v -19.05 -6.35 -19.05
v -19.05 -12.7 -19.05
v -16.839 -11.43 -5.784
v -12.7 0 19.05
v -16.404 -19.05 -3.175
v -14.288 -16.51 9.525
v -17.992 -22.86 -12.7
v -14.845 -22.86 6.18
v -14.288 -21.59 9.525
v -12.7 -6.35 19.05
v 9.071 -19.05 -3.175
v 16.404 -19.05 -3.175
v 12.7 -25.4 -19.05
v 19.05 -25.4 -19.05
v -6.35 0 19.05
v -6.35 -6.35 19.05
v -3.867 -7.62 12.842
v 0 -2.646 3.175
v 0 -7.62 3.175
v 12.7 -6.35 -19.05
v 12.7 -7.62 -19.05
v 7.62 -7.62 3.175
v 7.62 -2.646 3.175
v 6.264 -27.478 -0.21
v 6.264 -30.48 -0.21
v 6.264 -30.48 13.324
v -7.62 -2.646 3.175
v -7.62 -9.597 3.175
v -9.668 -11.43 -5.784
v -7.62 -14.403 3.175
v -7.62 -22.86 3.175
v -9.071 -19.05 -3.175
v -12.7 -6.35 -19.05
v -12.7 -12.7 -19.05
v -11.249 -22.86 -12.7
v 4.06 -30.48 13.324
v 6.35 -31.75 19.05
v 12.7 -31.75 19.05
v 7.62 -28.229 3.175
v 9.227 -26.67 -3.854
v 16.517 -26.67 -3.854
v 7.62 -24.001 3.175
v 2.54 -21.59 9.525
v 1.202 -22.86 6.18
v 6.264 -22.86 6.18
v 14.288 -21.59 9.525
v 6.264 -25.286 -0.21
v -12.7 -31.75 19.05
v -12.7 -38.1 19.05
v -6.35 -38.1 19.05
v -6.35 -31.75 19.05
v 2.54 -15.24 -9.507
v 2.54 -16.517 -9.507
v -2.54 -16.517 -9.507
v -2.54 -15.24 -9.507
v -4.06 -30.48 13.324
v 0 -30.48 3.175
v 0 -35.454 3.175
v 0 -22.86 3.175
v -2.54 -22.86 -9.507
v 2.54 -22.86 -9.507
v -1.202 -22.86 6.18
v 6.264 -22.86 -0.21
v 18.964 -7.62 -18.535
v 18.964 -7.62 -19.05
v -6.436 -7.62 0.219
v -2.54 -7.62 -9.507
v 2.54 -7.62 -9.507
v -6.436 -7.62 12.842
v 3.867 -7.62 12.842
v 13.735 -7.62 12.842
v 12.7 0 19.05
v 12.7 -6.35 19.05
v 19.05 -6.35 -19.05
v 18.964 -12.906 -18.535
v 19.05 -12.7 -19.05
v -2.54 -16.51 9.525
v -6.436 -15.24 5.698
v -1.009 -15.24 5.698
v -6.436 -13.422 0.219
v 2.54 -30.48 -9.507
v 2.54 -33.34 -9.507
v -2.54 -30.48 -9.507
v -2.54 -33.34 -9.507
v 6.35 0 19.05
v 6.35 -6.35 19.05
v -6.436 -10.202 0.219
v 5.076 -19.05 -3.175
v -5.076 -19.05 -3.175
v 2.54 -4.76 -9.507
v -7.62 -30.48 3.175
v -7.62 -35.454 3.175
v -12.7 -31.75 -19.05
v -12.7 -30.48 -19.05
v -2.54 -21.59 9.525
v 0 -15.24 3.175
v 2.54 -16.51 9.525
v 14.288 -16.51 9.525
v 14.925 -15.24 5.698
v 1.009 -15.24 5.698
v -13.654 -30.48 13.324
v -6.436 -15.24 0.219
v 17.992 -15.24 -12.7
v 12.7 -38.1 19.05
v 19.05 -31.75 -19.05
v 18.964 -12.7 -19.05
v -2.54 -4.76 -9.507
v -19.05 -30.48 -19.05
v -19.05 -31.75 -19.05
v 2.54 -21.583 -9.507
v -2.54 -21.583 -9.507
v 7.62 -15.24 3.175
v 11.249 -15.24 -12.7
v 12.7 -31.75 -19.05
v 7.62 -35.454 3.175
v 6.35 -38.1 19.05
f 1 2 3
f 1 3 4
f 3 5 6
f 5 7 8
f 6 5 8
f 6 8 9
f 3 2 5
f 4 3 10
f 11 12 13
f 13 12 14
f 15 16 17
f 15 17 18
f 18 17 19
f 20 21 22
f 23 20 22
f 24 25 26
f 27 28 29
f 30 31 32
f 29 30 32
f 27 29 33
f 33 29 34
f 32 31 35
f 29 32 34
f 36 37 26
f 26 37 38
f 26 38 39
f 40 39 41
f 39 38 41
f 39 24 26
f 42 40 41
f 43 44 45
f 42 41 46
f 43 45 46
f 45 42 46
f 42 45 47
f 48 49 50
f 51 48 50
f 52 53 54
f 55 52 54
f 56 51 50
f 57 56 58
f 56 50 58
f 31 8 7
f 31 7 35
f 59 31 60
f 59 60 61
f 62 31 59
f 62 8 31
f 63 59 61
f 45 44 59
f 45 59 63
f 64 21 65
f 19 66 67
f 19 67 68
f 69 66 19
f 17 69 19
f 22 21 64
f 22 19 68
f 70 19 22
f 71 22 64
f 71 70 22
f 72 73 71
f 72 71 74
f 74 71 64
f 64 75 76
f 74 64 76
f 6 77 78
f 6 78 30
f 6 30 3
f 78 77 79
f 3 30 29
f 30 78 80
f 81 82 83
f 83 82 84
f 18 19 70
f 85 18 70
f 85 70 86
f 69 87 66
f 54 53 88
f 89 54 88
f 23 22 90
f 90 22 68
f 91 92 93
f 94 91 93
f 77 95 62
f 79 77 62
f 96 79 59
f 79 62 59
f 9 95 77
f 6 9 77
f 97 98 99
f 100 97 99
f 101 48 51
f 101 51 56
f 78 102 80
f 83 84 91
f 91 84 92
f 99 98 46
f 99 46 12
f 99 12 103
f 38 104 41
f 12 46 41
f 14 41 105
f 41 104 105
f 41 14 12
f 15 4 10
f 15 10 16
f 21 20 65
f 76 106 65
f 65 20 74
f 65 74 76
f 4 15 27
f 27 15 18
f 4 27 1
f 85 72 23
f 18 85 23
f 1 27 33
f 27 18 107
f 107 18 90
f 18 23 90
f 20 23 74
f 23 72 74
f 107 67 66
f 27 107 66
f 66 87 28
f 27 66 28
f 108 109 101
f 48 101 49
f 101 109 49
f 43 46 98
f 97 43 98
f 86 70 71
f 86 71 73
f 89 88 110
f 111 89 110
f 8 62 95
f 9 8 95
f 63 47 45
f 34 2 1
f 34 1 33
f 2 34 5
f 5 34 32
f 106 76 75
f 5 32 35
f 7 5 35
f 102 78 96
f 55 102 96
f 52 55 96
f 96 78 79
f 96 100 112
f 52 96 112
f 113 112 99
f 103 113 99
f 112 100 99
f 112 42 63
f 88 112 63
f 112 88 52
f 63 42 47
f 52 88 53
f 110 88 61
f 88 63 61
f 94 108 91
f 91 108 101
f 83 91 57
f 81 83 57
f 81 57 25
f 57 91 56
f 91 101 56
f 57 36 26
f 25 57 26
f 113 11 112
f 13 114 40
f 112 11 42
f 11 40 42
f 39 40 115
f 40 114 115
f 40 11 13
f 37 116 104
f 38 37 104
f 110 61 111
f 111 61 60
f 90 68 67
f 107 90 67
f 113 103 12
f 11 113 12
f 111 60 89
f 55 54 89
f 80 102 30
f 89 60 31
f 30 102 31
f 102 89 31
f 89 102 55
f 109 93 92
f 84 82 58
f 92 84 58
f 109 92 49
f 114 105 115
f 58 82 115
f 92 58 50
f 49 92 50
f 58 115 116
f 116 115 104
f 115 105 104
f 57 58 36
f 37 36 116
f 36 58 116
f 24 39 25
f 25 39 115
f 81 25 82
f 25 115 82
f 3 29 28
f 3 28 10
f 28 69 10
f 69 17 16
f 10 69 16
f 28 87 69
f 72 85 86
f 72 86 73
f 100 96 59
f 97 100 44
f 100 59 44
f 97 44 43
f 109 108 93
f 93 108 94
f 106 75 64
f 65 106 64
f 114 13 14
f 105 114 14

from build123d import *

# Parameters (mm, degrees)
F0_W      = 38.1
F0_H      = 38.1
F1_DEPTH  = 38.1
F7_DEPTH  = 58.42
F8_DEPTH  = 38.1
F9_W      = 25.4
F9_H      = 7.62
F10_DEPTH = 63.5


with BuildPart() as f1:
    # F0 (on Front) → F1 (new body)
    with BuildSketch(Plane.XZ):
        Rectangle(F0_W, F0_H)
    extrude(amount=F1_DEPTH)

    # F5 (on offset) → F7 (cut)
    with BuildSketch(Plane.YZ.offset(38.1)):
        Polygon((-11.43, -5.783536), (-6.35, 19.05), (-31.75, 19.05), (-26.67, -3.85385), (-21.59, 9.525), (-16.51, 9.525), align=None)
        Polygon((-6.35, -19.05), (0, -19.05), (0, 19.05), align=None)
        Polygon((-25.4, -19.05), (-12.7, -19.05), (-19.05, -3.175), align=None)
        Polygon((-38.1, -19.05), (-31.75, -19.05), (-38.1, 19.05), align=None)
    extrude(amount=-F7_DEPTH, mode=Mode.SUBTRACT)

    # F6 (on offset) → F8 (cut)
    with BuildSketch(Plane.XZ.offset(38.1)):
        Polygon((6.35, 19.05), (-6.35, 19.05), (0, 3.175), align=None)
        Polygon((19.05, 19.05), (12.7, 19.05), (19.05, -19.05), align=None)
        Polygon((-7.62, 3.175), (-12.7, -19.05), (12.7, -19.05), (7.62, 3.175), (2.54, -9.507036), (-2.54, -9.507036), align=None)
        Polygon((-12.7, 19.05), (-19.05, 19.05), (-19.05, -19.05), align=None)
    extrude(amount=-F8_DEPTH, mode=Mode.SUBTRACT)

    # F9 (on offset) → F10 (cut)
    with BuildSketch(Plane.XY.offset(38.1)):
        with Locations((6.264115, -11.43)):
            Rectangle(F9_W, F9_H)
        with Locations((-6.435885, -26.67)):
            Rectangle(F9_W, F9_H)
    extrude(amount=-F10_DEPTH, mode=Mode.SUBTRACT)


solid = f1.part
